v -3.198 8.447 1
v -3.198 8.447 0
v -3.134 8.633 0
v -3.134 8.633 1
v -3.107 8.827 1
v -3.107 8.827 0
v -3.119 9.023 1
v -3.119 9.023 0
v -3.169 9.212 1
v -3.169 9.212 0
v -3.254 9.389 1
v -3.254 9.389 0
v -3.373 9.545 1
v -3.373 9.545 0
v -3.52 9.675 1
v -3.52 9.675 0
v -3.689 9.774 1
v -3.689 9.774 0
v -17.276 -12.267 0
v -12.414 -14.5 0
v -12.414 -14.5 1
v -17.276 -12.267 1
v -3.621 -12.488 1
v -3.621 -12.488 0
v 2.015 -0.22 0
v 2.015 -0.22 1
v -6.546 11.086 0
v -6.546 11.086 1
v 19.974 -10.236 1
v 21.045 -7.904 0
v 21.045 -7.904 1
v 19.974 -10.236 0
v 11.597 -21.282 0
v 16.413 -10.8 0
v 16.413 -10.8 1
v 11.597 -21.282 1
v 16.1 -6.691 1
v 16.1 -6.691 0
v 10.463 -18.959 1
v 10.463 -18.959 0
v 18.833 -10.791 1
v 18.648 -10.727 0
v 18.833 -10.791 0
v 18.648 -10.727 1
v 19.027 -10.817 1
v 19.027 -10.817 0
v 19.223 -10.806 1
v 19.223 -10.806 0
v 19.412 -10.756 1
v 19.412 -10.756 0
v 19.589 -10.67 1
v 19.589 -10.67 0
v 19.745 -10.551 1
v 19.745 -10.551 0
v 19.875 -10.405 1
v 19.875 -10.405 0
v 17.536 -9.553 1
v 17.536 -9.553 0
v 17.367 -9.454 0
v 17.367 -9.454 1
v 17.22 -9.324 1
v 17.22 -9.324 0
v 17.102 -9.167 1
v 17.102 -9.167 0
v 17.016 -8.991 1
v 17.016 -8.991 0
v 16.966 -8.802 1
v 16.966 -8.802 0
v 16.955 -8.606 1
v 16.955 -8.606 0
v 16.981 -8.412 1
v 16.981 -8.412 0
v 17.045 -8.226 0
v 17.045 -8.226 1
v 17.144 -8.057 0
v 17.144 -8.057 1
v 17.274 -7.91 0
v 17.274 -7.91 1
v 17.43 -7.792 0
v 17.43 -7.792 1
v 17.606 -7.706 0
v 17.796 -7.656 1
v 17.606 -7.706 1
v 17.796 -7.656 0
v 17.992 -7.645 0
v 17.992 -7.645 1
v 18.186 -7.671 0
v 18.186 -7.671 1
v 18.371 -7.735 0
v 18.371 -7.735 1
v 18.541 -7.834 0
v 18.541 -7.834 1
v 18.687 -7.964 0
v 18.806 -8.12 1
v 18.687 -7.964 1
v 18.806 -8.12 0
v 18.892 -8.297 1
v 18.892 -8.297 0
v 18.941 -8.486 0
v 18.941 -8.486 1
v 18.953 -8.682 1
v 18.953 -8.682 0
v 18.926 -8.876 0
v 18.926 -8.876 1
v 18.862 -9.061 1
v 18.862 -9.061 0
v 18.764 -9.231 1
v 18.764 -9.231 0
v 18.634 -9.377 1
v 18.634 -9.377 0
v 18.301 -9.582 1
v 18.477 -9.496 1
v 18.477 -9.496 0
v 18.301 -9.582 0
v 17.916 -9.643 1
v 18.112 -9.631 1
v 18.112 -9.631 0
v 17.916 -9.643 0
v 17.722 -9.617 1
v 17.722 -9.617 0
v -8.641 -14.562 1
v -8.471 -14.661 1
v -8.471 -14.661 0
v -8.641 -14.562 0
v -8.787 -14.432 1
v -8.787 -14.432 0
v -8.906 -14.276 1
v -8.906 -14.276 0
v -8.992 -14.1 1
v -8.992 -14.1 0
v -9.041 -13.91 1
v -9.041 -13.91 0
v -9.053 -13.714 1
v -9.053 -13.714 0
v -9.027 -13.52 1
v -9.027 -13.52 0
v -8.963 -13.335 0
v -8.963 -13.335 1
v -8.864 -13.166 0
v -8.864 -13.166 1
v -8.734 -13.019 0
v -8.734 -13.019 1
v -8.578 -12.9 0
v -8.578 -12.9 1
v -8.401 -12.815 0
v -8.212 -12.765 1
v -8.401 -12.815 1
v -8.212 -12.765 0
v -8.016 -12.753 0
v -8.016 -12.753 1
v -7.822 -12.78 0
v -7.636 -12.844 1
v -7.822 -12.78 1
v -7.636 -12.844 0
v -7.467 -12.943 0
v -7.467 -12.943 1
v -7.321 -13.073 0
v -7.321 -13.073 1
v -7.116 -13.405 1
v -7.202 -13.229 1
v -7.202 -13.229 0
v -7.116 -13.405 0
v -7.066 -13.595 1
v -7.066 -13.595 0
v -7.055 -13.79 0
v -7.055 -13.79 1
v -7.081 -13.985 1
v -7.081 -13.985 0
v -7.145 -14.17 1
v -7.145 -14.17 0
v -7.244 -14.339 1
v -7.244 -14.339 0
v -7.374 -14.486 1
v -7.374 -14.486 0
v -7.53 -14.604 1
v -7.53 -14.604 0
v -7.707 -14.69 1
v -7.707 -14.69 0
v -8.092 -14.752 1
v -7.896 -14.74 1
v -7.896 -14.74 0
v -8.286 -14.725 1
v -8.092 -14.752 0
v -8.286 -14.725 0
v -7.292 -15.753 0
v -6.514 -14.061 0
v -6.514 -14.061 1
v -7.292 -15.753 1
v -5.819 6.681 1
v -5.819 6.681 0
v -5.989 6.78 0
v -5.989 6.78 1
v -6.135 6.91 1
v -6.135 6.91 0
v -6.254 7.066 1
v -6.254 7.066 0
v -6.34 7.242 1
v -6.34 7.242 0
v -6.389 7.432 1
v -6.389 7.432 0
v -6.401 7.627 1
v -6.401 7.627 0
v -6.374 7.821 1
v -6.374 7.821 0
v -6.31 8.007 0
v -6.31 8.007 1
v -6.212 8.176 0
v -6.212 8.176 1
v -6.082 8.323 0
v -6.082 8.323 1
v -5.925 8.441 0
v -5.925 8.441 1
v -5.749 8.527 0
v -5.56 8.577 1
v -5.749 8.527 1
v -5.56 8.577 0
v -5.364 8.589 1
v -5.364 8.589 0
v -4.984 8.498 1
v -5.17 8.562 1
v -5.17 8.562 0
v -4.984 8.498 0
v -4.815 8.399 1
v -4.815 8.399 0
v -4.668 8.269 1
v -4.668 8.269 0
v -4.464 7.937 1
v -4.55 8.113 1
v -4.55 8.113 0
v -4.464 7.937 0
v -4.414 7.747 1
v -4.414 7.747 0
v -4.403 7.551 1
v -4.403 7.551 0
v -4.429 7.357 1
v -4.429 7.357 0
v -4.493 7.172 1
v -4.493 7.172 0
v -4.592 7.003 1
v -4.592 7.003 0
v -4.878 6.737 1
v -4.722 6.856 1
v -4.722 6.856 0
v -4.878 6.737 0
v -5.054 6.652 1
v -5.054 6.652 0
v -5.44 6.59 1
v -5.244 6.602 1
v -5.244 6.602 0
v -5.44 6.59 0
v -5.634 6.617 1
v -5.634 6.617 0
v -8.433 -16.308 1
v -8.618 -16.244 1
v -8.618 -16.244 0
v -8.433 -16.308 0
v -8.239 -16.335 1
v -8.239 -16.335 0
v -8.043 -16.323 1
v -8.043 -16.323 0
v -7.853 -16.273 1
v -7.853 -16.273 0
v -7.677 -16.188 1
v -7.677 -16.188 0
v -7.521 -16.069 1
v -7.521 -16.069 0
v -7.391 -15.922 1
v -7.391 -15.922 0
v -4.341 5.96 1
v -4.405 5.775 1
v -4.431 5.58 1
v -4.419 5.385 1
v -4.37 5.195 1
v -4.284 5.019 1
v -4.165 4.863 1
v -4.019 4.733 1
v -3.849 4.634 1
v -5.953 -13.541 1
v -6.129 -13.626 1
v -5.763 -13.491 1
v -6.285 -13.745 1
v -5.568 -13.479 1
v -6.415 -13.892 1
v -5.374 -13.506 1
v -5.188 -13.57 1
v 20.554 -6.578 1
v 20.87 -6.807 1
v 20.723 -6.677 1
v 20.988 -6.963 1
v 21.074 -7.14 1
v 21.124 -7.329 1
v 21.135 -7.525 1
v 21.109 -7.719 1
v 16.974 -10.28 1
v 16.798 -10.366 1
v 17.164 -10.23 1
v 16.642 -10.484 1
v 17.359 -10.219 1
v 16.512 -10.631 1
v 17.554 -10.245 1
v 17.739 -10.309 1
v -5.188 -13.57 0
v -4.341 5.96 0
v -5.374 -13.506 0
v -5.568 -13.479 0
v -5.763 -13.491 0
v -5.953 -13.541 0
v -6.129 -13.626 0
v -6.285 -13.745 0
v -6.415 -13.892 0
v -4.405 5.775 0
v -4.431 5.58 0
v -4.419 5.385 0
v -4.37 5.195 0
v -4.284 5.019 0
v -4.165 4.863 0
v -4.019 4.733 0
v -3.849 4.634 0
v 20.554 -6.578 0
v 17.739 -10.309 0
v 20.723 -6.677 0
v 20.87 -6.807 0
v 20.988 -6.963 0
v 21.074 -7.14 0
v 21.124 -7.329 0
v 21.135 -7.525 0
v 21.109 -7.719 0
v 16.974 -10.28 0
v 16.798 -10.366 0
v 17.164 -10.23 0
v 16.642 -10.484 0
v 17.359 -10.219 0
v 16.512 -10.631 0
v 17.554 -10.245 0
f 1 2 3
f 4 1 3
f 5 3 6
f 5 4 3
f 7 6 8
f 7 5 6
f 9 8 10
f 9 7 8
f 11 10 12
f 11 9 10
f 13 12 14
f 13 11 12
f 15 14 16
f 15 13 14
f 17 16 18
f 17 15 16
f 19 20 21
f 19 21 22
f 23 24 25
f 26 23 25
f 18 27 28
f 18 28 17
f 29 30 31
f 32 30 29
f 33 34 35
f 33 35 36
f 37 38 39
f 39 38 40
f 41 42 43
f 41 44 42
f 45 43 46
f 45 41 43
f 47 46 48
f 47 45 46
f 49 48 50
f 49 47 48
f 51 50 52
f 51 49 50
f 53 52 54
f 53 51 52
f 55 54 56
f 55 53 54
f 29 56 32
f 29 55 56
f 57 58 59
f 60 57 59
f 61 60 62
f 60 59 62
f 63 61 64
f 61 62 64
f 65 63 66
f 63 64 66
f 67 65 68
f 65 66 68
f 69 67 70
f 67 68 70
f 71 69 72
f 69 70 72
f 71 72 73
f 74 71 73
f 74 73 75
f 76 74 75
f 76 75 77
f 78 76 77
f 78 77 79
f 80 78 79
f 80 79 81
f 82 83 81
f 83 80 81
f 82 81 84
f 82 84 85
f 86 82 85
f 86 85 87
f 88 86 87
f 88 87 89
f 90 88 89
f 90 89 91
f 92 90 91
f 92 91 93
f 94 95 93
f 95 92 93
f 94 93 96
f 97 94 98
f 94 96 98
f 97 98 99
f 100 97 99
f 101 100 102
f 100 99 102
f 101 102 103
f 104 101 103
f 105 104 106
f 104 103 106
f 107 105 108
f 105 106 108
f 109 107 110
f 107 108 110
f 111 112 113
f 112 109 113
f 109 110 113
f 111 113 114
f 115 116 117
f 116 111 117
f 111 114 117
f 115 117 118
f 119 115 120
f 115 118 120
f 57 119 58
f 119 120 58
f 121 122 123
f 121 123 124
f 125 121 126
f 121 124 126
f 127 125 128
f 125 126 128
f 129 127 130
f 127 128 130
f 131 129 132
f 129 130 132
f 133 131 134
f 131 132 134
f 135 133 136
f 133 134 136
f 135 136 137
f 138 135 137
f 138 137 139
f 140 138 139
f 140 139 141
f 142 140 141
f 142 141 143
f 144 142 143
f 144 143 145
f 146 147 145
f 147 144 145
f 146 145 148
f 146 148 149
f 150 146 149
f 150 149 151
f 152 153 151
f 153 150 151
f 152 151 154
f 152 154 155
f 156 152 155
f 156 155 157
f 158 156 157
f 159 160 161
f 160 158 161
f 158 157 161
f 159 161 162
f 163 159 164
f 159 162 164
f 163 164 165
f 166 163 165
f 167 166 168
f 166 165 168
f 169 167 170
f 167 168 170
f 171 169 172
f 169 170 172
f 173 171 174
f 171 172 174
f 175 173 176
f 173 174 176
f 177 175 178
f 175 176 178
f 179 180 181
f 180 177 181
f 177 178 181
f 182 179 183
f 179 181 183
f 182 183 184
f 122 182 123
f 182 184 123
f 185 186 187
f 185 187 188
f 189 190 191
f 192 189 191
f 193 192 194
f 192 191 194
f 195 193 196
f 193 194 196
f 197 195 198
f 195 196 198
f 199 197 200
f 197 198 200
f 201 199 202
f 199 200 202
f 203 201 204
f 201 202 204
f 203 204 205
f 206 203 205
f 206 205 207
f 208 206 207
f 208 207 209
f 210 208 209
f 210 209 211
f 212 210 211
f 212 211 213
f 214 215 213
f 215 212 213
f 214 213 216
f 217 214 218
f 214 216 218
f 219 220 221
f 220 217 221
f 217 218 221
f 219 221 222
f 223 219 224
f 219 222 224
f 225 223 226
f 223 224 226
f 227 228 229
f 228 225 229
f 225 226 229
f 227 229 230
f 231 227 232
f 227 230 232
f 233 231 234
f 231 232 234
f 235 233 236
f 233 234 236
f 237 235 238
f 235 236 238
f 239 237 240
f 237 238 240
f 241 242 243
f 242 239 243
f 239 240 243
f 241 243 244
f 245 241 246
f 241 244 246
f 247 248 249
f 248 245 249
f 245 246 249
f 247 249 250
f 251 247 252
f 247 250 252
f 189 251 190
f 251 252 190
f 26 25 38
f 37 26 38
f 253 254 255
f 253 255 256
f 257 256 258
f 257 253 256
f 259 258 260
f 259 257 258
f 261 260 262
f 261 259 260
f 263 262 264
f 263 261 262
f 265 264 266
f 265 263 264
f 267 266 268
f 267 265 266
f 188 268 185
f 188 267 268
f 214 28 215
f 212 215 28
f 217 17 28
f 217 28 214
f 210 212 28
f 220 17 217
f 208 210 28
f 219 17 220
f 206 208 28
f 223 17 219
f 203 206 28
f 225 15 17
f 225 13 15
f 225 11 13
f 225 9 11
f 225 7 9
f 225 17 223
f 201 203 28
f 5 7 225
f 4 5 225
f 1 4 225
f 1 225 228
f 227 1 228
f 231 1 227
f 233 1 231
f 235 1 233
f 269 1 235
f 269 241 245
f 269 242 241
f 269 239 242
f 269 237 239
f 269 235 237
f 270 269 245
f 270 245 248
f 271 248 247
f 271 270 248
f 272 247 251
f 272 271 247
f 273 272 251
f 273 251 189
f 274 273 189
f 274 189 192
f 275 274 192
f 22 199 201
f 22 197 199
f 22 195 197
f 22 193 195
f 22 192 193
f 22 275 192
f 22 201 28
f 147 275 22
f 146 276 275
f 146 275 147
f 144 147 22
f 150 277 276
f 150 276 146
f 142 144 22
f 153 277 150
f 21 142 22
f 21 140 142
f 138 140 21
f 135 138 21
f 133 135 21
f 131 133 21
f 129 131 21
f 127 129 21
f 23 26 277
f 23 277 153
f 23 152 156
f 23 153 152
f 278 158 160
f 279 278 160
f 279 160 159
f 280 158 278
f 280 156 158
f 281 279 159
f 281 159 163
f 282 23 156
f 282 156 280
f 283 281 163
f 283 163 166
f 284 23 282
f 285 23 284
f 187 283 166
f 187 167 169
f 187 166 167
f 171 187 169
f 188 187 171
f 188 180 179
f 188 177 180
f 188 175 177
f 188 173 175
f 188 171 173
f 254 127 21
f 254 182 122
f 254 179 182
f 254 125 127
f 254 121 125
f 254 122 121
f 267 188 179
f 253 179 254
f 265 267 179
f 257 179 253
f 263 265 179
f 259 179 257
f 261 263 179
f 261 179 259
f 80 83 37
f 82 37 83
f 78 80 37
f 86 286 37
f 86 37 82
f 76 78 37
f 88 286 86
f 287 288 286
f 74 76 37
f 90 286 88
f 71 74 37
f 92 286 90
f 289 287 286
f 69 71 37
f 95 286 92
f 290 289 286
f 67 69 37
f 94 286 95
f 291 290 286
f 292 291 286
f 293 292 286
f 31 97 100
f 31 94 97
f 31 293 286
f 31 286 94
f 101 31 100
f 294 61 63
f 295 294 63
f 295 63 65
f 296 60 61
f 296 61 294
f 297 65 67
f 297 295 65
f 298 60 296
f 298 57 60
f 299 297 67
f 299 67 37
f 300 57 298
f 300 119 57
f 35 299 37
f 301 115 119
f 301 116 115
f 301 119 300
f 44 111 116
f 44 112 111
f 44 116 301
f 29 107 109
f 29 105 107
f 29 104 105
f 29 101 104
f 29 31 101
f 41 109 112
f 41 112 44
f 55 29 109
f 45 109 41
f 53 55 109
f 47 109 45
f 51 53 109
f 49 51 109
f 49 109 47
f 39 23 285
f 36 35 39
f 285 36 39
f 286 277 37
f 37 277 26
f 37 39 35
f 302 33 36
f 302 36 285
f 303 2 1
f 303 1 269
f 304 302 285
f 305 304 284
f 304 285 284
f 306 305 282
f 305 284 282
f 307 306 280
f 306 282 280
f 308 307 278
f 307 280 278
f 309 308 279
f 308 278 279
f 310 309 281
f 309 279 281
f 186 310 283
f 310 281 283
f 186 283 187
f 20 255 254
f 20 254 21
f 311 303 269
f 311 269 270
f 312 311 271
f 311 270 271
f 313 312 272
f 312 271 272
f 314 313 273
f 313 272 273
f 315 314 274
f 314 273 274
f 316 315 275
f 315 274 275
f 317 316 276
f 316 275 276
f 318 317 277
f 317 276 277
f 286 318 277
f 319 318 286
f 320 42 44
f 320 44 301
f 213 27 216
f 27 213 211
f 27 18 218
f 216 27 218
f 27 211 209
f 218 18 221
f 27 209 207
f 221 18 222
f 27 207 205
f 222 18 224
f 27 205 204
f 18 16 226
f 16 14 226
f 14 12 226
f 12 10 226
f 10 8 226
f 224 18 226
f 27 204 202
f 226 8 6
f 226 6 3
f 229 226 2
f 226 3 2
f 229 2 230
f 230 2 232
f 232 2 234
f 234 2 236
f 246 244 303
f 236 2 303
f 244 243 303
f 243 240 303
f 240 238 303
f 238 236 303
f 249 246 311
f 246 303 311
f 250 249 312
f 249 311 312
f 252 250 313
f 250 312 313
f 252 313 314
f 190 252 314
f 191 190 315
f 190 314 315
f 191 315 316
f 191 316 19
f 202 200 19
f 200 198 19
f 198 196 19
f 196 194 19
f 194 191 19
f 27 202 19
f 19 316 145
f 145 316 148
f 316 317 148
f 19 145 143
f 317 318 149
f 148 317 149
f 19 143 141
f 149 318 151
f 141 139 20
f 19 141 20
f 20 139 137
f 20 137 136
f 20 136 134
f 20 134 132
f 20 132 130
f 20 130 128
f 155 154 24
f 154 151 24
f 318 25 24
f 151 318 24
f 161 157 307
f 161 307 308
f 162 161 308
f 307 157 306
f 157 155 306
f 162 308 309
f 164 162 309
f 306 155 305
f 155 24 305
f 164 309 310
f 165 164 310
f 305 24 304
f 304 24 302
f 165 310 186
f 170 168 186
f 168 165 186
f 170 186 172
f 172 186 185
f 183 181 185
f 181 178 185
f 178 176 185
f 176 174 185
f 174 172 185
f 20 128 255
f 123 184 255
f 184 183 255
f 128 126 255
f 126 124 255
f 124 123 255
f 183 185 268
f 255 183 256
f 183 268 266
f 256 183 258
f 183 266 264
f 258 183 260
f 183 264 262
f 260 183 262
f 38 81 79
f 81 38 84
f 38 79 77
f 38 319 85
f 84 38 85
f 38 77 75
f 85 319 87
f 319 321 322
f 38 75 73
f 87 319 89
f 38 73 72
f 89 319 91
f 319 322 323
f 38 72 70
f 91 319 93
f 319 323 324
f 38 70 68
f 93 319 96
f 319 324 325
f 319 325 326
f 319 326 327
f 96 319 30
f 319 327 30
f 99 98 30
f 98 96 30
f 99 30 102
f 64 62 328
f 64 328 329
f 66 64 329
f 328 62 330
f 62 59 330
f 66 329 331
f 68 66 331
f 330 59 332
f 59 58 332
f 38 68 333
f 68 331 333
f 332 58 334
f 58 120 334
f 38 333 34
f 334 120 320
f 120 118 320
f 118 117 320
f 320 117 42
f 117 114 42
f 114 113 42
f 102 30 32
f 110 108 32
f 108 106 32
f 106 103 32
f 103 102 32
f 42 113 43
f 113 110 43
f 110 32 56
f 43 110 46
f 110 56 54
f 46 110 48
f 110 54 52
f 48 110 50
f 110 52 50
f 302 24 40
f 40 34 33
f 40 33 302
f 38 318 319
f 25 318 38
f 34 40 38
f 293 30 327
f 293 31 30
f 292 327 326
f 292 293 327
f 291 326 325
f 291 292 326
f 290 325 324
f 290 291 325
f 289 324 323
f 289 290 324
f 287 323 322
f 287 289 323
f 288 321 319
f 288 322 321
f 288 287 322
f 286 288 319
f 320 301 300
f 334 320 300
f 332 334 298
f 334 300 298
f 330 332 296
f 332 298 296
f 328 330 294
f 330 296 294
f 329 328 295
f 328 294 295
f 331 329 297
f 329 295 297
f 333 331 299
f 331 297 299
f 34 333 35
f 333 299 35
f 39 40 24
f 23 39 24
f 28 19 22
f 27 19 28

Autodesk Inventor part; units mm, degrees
ref_plane "YZ Plane" through (0, 0, 0) normal (1, 0, 0) x (0, 1, 0)
ref_plane "XZ Plane" through (0, 0, 0) normal (0, 1, 0) x (-1, 0, 0)
ref_plane "XY Plane" through (0, 0, 0) normal (0, 0, 1) x (1, 0, 0)
ref_plane "Work Plane1" through (7.2162, 6.7561, 0) normal (0, 0, 1) x (-0.4175, -0.9087, 0)
sketch "Sketch1" plane through (7.2162, 6.7561, 0) normal (0, 0, 1) x (-0.4175, -0.9087, 0)
  circle A0 centre (9.5108, 16.1864) radius 1
  circle A1 centre (25.0108, -5.3136) radius 1
  circle A2 centre (4.5108, -11.8136) radius 1
  line L0 (22.0108, -1.8136) -> (8.5108, -1.8136)
  line L1 (8.5108, -1.8136) -> (8.5108, 13.6864)
  line L2 (8.5108, 13.6864) -> (22.0108, 13.6864)
  line L3 (22.0108, 13.6864) -> (22.0108, -1.8136)
  line L4 (11.1138, 15.6864) -> (23.6484, 15.6864)
  line L5 (23.6484, 15.6864) -> (23.6484, -3.7858)
  line L6 (23.6484, -3.7858) -> (27.5108, -3.7858)
  line L7 (27.5108, -3.7858) -> (27.5108, -8.9631)
  line L8 (27.5108, -8.9631) -> (27.5108, -14.3136)
  line L9 (27.5108, -14.3136) -> (1.8108, -14.3136)
  line L10 (1.8108, -14.3136) -> (1.8108, -10.169)
  line L11 (1.8108, -10.169) -> (6.5484, -10.169)
  line L12 (6.5484, -10.169) -> (6.5484, 18.6864)
  line L13 (6.5484, 18.6864) -> (11.1138, 18.6864)
  line L14 (11.1138, 18.6864) -> (11.1138, 15.6864)
  point P0 (9.1519, -3.7364)
  dimension "d0" = 2
  dimension "d1" = 2
  dimension "d2" = 2
  dimension "d3" = 28
  dimension "d5" = 15.5
  dimension "d6" = 5
  dimension "d8" = 20.5
  dimension "d9" = 2.5
  dimension "d10" = 1
  dimension "d12" = 3
  dimension "d13" = 33
  dimension "d14" = 25.7
  dimension "d15" = 17.1
  dimension "d23" = 30.5
  dimension "d24" = 9
  dimension "d25" = 2.5
extrude "Extrusion1" add sketch "Sketch1" along normal blind 1
fillet "Fillet1" radius 1 7 edges at (21.4621, -6.996, 0.5) (19.556, -11.1444, 0.5) (16.83, -9.8919, 0.5) (-6.0973, -13.1521, 0.5) (-7.7098, -16.6617, 0.5) (-2.7802, 9.3562, 0.5) (-4.7582, 5.0513, 0.5)
properties part number "00_KES400_Bluray_Lens"
